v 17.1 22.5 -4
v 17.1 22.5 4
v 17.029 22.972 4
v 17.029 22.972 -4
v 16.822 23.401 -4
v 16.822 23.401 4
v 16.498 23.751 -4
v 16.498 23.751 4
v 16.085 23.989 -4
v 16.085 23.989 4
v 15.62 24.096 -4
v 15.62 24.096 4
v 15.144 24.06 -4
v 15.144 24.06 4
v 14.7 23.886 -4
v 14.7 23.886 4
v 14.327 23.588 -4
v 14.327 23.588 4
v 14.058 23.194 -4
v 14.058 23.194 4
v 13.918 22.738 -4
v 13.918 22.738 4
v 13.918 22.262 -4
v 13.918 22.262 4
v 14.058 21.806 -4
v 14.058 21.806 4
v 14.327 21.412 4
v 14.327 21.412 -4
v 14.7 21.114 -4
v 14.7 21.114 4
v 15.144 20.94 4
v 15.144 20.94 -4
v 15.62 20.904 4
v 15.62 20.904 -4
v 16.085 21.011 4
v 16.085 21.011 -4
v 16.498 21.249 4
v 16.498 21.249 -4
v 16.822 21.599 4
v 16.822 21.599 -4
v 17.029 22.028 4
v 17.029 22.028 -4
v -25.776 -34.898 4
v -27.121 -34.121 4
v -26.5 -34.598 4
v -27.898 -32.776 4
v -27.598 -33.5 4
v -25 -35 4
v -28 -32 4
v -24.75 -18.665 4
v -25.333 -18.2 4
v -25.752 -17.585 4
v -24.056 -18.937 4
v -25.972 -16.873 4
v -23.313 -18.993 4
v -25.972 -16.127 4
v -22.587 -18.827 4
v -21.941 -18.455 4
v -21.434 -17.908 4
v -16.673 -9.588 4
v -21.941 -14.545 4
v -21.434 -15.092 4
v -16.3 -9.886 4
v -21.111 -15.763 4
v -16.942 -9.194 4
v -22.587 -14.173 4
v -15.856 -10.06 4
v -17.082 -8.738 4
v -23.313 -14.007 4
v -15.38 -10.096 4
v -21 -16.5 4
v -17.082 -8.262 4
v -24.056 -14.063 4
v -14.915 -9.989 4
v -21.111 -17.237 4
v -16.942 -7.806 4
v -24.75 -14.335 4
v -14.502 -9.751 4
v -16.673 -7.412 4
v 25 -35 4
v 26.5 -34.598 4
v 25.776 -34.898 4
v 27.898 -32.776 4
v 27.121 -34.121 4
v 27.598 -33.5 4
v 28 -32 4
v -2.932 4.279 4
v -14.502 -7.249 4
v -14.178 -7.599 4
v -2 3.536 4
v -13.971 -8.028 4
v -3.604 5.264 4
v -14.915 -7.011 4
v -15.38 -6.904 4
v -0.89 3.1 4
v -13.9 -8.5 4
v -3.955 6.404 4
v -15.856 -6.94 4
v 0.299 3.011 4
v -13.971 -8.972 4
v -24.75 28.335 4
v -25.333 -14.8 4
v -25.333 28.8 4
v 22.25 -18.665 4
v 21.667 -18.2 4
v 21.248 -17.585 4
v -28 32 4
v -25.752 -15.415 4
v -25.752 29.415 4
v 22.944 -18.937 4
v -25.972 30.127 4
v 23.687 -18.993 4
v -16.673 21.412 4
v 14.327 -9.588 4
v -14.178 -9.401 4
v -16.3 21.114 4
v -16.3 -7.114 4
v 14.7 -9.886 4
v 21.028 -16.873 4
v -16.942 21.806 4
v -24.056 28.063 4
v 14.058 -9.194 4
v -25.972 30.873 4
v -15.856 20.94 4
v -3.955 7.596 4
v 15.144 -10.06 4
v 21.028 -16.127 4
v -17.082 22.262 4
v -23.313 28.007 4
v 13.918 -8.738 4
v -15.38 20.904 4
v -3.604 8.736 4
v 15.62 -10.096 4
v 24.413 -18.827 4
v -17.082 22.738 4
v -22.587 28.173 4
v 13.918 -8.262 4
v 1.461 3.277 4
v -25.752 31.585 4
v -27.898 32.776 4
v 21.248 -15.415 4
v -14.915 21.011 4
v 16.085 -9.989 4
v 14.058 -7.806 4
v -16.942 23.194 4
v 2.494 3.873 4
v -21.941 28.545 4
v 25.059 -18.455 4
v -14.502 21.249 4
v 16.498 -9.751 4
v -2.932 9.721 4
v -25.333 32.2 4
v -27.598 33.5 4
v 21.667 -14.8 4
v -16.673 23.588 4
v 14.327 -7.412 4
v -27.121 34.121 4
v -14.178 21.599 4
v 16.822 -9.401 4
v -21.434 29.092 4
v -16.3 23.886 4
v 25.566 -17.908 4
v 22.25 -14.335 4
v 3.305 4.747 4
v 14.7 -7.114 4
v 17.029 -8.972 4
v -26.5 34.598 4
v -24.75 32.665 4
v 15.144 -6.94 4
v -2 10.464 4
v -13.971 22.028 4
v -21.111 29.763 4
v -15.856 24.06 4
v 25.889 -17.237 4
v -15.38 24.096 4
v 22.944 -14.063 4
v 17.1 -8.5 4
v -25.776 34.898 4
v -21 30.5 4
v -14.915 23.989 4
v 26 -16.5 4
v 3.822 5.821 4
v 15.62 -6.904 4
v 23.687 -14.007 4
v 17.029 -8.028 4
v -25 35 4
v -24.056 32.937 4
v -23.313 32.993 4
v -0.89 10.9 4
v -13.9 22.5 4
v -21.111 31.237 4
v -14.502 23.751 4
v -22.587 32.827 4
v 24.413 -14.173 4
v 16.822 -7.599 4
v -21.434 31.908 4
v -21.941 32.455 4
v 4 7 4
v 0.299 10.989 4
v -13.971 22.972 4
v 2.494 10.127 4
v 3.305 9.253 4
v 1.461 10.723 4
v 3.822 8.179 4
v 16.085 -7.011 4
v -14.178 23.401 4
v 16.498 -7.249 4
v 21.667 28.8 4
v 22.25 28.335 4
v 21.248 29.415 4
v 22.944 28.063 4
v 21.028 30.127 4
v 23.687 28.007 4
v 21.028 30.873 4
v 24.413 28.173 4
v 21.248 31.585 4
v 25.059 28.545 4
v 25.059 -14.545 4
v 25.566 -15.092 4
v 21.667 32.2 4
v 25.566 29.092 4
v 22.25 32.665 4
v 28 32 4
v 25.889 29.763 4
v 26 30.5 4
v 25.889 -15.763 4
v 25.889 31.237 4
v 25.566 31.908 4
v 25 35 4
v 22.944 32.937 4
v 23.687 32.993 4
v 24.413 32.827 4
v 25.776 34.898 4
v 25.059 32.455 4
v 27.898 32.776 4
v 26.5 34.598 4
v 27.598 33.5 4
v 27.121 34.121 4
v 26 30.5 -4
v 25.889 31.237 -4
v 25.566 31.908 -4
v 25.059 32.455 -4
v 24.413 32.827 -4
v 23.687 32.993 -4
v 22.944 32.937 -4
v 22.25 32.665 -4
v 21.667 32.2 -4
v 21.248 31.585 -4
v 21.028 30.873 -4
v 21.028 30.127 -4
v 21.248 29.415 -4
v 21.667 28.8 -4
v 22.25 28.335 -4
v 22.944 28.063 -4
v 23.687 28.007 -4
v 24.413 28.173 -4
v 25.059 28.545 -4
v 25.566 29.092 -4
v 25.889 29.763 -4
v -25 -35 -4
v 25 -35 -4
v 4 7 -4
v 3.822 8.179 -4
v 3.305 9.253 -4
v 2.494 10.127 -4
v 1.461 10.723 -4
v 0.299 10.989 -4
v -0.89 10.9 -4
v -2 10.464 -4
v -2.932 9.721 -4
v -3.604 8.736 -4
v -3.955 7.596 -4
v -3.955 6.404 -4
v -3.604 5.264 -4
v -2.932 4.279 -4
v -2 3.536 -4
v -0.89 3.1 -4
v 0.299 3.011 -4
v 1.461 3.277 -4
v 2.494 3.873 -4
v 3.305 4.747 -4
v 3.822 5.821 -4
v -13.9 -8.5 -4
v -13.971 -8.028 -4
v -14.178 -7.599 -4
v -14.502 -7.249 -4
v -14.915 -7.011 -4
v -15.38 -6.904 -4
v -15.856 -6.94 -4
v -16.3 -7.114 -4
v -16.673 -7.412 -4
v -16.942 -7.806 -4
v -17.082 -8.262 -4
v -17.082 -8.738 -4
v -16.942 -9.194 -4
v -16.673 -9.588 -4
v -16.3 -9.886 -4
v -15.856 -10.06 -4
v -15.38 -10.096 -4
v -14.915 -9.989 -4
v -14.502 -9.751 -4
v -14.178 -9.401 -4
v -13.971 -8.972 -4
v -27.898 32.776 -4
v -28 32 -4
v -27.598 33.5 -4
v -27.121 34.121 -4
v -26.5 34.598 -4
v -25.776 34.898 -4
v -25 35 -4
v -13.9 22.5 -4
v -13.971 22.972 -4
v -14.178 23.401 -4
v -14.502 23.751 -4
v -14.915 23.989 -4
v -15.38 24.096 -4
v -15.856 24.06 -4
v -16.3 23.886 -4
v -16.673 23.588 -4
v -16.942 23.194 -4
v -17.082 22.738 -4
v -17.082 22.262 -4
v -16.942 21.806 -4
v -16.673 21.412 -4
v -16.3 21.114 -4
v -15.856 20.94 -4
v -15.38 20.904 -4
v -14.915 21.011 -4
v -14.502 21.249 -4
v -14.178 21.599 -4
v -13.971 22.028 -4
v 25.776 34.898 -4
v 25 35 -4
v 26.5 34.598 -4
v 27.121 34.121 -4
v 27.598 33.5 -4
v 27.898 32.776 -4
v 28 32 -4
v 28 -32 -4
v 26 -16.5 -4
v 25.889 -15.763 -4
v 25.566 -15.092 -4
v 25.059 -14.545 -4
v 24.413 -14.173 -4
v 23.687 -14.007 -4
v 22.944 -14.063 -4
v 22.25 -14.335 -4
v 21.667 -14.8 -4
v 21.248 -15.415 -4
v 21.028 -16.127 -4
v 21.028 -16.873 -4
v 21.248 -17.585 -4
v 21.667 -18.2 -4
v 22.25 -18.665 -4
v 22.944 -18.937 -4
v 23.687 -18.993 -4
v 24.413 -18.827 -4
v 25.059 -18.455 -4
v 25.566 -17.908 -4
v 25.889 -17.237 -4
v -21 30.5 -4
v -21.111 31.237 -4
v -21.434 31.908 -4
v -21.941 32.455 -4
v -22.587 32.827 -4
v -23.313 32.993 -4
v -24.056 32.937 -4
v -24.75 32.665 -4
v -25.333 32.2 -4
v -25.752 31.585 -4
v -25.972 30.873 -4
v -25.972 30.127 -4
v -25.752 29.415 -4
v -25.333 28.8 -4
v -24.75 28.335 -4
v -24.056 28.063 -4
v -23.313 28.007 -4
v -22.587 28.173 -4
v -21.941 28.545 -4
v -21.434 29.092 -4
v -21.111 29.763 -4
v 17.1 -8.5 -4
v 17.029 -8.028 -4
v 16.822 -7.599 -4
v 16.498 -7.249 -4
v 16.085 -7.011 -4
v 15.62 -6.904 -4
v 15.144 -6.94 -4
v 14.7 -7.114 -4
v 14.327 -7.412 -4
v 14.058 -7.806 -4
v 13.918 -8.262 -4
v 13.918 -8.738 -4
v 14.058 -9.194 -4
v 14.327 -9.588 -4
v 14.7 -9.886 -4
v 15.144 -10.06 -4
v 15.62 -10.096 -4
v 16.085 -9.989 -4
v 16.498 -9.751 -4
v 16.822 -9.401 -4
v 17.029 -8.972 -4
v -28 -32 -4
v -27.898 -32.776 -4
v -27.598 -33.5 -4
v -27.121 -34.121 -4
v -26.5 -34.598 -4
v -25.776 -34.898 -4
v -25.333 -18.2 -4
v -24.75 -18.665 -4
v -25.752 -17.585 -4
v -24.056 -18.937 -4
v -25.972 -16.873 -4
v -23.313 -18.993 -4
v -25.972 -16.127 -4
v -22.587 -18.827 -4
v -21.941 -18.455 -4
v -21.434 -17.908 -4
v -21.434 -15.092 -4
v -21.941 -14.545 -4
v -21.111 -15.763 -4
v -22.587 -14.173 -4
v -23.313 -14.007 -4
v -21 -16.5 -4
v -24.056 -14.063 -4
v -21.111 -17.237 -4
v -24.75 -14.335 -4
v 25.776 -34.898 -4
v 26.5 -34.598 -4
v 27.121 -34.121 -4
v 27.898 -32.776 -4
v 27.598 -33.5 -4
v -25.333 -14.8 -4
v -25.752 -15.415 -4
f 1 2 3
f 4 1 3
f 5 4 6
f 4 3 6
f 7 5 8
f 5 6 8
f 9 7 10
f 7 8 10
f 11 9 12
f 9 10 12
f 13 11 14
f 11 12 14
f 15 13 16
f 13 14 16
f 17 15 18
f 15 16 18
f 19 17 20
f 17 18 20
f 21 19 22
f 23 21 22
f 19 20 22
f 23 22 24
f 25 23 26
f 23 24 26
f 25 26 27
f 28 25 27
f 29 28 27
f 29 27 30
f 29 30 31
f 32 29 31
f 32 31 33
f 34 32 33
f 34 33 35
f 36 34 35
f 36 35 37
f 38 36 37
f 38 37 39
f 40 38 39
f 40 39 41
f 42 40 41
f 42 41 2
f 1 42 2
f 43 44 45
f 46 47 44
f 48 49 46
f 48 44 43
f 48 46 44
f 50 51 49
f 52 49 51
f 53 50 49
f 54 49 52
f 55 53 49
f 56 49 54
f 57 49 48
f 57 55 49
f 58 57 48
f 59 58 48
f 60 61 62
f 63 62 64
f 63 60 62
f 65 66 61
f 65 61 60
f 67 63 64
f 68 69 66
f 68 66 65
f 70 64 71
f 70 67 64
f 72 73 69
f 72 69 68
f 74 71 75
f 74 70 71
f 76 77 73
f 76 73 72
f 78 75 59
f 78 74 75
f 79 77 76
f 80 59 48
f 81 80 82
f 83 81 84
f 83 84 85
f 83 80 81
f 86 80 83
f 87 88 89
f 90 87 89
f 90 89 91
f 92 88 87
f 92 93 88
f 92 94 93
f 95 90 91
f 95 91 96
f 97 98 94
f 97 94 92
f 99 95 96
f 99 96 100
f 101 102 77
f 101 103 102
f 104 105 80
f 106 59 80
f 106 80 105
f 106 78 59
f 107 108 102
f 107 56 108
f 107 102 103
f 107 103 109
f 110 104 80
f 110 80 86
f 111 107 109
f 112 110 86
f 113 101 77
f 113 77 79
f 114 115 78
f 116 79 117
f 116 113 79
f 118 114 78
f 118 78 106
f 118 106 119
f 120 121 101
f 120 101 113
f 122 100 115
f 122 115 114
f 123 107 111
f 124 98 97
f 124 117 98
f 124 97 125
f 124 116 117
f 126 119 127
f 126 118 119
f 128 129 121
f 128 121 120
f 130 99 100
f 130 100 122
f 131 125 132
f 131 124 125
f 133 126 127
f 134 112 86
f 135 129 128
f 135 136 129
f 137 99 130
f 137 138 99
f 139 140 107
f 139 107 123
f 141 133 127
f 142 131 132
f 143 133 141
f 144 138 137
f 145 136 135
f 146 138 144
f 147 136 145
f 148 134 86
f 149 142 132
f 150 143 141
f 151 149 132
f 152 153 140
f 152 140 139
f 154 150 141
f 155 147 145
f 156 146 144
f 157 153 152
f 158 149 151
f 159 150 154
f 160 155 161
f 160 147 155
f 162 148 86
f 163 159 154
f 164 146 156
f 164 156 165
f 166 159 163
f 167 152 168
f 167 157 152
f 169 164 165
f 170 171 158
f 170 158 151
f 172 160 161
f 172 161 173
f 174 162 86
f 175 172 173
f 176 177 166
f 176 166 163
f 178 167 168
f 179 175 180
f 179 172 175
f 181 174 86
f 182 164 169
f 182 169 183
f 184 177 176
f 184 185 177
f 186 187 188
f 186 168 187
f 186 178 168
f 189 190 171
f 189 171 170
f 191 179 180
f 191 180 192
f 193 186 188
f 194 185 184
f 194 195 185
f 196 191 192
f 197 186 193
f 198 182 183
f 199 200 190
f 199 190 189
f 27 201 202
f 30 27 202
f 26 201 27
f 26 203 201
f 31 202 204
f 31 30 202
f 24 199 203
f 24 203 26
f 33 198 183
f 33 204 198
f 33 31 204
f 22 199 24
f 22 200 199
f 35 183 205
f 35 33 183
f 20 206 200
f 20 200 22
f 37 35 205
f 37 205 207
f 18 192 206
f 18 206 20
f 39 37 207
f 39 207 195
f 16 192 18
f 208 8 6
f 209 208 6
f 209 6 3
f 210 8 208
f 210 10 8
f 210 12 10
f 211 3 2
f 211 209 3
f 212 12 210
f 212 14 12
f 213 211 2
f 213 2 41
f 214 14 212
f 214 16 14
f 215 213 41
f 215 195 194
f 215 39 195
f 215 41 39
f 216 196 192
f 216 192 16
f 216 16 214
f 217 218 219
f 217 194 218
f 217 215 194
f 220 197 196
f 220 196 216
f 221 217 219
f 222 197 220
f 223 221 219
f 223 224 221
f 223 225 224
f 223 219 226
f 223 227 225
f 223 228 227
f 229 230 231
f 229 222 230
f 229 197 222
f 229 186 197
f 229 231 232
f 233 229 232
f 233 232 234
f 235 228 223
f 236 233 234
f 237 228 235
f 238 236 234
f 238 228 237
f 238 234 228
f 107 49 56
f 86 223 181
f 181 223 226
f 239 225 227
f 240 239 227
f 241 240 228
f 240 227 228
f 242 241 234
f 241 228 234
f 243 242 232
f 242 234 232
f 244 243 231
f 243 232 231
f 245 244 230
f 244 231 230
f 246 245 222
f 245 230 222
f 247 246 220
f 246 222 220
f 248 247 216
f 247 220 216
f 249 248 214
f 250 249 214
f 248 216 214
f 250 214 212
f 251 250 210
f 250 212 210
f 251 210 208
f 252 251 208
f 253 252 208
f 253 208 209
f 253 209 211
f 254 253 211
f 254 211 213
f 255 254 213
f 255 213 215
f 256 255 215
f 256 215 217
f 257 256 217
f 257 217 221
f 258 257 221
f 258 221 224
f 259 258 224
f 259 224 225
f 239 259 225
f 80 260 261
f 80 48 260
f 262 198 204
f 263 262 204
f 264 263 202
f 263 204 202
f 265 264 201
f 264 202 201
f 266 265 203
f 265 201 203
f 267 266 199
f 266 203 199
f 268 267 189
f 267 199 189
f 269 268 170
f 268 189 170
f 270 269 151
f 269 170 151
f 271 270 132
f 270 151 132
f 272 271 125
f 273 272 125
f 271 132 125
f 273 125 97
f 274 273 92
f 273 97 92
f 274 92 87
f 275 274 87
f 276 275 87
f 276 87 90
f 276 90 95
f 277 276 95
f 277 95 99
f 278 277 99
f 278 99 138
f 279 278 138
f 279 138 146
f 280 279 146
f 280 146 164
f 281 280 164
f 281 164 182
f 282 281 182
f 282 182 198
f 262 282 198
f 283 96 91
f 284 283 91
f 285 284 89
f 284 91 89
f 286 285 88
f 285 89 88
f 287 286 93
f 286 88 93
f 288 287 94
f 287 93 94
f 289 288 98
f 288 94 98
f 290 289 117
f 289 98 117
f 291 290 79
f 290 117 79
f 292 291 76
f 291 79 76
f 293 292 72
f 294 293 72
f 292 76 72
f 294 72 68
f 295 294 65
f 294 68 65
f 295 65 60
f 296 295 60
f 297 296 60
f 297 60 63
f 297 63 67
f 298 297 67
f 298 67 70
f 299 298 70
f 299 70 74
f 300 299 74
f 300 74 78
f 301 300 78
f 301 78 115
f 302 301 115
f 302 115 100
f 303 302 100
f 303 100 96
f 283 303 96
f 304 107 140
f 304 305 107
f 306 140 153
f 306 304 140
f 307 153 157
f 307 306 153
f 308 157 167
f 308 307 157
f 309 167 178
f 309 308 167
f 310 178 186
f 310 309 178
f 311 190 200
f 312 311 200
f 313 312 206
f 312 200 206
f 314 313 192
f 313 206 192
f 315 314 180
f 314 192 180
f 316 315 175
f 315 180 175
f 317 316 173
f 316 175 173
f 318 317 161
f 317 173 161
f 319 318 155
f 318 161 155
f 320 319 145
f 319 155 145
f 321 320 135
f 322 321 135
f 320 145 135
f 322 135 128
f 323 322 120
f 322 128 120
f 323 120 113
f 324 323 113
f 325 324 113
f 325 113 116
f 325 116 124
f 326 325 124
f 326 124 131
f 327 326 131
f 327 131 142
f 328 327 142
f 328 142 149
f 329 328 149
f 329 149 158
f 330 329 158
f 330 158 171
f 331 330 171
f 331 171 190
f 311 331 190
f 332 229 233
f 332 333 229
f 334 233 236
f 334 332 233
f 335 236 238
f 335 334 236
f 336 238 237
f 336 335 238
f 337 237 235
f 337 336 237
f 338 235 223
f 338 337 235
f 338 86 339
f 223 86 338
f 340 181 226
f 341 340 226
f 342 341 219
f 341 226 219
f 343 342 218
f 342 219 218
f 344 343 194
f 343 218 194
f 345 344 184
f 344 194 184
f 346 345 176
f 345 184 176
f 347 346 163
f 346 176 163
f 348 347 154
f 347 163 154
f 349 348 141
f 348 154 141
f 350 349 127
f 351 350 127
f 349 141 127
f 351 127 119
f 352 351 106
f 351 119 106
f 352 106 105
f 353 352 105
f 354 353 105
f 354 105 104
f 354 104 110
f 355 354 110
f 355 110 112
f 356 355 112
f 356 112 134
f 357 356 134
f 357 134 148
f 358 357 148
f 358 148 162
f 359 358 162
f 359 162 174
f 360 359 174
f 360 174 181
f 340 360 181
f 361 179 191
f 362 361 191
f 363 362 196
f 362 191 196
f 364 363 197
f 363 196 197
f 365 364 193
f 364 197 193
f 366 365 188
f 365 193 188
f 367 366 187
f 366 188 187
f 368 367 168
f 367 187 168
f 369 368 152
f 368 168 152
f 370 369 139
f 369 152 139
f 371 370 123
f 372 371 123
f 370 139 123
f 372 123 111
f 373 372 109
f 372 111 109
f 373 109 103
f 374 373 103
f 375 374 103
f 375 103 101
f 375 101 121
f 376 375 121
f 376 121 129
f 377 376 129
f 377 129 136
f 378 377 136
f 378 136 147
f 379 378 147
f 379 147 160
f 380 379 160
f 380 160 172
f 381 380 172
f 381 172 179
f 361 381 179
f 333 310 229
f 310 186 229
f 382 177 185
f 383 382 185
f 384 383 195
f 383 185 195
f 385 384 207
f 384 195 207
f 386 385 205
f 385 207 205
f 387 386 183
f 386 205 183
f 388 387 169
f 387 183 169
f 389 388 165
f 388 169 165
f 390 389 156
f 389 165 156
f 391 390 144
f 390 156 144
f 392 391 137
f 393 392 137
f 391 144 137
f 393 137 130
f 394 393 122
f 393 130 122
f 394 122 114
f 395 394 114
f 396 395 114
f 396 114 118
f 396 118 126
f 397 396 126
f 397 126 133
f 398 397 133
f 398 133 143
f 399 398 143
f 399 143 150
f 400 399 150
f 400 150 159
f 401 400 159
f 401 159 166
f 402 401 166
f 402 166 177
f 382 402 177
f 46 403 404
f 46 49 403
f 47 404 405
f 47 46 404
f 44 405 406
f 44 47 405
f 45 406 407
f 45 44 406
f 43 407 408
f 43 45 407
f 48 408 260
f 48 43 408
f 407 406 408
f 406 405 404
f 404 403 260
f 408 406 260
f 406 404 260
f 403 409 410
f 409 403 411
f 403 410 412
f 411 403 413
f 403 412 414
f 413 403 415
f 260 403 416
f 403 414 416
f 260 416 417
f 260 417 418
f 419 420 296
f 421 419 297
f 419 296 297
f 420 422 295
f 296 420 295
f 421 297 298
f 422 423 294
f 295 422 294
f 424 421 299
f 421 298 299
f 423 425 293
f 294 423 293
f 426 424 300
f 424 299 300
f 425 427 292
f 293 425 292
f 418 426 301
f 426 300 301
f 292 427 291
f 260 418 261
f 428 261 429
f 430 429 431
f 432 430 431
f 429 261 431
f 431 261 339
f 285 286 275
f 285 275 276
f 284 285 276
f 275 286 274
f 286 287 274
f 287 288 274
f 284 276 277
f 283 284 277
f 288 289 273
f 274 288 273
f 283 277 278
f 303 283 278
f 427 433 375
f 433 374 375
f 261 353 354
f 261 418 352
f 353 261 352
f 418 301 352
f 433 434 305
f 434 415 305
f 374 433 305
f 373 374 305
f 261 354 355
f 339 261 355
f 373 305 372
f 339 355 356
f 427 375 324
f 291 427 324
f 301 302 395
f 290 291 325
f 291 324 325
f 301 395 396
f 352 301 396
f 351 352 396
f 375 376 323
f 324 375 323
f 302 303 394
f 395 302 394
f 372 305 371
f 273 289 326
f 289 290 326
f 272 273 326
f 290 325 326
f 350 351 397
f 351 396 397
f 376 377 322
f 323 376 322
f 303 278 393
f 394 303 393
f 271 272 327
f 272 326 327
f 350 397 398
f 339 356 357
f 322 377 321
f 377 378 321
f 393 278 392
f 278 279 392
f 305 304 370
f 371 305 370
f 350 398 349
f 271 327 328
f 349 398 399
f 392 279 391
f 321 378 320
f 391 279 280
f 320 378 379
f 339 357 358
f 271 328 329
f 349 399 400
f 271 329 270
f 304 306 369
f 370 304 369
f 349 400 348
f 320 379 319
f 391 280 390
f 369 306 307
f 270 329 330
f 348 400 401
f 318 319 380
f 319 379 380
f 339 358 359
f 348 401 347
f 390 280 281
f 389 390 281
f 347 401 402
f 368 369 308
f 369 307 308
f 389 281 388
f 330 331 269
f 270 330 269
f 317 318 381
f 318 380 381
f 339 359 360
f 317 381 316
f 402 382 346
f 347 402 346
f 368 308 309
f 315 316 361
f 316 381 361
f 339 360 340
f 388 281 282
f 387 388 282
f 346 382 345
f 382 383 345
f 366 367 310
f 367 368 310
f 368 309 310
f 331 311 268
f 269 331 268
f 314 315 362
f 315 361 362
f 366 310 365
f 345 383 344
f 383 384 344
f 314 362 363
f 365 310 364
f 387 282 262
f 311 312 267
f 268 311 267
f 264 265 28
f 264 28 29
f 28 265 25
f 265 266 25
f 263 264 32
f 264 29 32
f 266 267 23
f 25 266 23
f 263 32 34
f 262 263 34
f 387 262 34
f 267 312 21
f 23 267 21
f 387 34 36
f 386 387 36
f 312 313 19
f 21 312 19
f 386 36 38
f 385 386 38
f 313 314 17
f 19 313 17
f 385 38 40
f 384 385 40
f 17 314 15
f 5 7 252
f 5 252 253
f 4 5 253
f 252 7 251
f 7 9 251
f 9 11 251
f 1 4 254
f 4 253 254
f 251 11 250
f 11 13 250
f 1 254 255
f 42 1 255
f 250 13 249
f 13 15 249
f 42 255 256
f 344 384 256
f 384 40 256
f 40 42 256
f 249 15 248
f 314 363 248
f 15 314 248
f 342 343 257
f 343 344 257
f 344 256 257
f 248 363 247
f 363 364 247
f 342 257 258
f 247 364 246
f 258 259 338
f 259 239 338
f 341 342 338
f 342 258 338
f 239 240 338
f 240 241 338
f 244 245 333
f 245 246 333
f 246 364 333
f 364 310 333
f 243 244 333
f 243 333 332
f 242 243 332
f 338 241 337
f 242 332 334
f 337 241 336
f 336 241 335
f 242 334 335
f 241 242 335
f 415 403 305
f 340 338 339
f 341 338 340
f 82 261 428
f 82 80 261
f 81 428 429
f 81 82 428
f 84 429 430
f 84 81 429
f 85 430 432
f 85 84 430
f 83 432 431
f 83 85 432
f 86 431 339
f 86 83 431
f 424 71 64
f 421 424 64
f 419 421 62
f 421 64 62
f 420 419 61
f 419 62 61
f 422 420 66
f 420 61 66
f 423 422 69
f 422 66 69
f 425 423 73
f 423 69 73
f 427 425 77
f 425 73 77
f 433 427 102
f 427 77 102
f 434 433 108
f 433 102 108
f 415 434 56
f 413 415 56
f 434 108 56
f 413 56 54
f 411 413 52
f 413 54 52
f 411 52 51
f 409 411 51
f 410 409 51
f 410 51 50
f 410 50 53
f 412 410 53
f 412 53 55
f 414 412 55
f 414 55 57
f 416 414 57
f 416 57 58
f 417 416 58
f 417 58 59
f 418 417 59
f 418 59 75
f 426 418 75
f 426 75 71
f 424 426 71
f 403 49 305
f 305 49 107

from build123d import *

# Parameters (mm, degrees)
SKETCH1_W           = 56
SKETCH1_H           = 70
BOSS_EXTRUDE1_DEPTH = 4
SKETCH2_R           = 2.5
SKETCH2_R_2         = 4
SKETCH2_R_3         = 1.6
CUT_EXTRUDE1_DEPTH  = 46.530209751
FILLET1_R           = 3


with BuildPart() as part:
    # Sketch1 → Boss-Extrude1 (new, symmetric)
    with BuildSketch(Plane.XY):
        Rectangle(SKETCH1_W, SKETCH1_H)
    extrude(amount=BOSS_EXTRUDE1_DEPTH, both=True)

    # Sketch2 → Cut-Extrude1 (cut, through all)
    with BuildSketch(Plane.XY.offset(4)):
        with Locations((-23.5, 30.5)):
            Circle(SKETCH2_R)
        with Locations((23.5, 30.5)):
            Circle(SKETCH2_R)
        with Locations((23.5, -16.5)):
            Circle(SKETCH2_R)
        with Locations((-23.5, -16.5)):
            Circle(SKETCH2_R)
        with Locations((0, 7)):
            Circle(SKETCH2_R_2)
        with Locations((-15.5, 22.5)):
            Circle(SKETCH2_R_3)
        with Locations((15.5, 22.5)):
            Circle(SKETCH2_R_3)
        with Locations((15.5, -8.5)):
            Circle(SKETCH2_R_3)
        with Locations((-15.5, -8.5)):
            Circle(SKETCH2_R_3)
    extrude(amount=-CUT_EXTRUDE1_DEPTH, mode=Mode.SUBTRACT)

    # Fillet1
    fillet1_edges = [part.edges().sort_by_distance(p)[0] for p in [
        (28, -35, 0),
        (-28, -35, 0),
        (-28, 35, 0),
        (28, 35, 0),
    ]]
    fillet(fillet1_edges, radius=FILLET1_R)


solid = part.part
